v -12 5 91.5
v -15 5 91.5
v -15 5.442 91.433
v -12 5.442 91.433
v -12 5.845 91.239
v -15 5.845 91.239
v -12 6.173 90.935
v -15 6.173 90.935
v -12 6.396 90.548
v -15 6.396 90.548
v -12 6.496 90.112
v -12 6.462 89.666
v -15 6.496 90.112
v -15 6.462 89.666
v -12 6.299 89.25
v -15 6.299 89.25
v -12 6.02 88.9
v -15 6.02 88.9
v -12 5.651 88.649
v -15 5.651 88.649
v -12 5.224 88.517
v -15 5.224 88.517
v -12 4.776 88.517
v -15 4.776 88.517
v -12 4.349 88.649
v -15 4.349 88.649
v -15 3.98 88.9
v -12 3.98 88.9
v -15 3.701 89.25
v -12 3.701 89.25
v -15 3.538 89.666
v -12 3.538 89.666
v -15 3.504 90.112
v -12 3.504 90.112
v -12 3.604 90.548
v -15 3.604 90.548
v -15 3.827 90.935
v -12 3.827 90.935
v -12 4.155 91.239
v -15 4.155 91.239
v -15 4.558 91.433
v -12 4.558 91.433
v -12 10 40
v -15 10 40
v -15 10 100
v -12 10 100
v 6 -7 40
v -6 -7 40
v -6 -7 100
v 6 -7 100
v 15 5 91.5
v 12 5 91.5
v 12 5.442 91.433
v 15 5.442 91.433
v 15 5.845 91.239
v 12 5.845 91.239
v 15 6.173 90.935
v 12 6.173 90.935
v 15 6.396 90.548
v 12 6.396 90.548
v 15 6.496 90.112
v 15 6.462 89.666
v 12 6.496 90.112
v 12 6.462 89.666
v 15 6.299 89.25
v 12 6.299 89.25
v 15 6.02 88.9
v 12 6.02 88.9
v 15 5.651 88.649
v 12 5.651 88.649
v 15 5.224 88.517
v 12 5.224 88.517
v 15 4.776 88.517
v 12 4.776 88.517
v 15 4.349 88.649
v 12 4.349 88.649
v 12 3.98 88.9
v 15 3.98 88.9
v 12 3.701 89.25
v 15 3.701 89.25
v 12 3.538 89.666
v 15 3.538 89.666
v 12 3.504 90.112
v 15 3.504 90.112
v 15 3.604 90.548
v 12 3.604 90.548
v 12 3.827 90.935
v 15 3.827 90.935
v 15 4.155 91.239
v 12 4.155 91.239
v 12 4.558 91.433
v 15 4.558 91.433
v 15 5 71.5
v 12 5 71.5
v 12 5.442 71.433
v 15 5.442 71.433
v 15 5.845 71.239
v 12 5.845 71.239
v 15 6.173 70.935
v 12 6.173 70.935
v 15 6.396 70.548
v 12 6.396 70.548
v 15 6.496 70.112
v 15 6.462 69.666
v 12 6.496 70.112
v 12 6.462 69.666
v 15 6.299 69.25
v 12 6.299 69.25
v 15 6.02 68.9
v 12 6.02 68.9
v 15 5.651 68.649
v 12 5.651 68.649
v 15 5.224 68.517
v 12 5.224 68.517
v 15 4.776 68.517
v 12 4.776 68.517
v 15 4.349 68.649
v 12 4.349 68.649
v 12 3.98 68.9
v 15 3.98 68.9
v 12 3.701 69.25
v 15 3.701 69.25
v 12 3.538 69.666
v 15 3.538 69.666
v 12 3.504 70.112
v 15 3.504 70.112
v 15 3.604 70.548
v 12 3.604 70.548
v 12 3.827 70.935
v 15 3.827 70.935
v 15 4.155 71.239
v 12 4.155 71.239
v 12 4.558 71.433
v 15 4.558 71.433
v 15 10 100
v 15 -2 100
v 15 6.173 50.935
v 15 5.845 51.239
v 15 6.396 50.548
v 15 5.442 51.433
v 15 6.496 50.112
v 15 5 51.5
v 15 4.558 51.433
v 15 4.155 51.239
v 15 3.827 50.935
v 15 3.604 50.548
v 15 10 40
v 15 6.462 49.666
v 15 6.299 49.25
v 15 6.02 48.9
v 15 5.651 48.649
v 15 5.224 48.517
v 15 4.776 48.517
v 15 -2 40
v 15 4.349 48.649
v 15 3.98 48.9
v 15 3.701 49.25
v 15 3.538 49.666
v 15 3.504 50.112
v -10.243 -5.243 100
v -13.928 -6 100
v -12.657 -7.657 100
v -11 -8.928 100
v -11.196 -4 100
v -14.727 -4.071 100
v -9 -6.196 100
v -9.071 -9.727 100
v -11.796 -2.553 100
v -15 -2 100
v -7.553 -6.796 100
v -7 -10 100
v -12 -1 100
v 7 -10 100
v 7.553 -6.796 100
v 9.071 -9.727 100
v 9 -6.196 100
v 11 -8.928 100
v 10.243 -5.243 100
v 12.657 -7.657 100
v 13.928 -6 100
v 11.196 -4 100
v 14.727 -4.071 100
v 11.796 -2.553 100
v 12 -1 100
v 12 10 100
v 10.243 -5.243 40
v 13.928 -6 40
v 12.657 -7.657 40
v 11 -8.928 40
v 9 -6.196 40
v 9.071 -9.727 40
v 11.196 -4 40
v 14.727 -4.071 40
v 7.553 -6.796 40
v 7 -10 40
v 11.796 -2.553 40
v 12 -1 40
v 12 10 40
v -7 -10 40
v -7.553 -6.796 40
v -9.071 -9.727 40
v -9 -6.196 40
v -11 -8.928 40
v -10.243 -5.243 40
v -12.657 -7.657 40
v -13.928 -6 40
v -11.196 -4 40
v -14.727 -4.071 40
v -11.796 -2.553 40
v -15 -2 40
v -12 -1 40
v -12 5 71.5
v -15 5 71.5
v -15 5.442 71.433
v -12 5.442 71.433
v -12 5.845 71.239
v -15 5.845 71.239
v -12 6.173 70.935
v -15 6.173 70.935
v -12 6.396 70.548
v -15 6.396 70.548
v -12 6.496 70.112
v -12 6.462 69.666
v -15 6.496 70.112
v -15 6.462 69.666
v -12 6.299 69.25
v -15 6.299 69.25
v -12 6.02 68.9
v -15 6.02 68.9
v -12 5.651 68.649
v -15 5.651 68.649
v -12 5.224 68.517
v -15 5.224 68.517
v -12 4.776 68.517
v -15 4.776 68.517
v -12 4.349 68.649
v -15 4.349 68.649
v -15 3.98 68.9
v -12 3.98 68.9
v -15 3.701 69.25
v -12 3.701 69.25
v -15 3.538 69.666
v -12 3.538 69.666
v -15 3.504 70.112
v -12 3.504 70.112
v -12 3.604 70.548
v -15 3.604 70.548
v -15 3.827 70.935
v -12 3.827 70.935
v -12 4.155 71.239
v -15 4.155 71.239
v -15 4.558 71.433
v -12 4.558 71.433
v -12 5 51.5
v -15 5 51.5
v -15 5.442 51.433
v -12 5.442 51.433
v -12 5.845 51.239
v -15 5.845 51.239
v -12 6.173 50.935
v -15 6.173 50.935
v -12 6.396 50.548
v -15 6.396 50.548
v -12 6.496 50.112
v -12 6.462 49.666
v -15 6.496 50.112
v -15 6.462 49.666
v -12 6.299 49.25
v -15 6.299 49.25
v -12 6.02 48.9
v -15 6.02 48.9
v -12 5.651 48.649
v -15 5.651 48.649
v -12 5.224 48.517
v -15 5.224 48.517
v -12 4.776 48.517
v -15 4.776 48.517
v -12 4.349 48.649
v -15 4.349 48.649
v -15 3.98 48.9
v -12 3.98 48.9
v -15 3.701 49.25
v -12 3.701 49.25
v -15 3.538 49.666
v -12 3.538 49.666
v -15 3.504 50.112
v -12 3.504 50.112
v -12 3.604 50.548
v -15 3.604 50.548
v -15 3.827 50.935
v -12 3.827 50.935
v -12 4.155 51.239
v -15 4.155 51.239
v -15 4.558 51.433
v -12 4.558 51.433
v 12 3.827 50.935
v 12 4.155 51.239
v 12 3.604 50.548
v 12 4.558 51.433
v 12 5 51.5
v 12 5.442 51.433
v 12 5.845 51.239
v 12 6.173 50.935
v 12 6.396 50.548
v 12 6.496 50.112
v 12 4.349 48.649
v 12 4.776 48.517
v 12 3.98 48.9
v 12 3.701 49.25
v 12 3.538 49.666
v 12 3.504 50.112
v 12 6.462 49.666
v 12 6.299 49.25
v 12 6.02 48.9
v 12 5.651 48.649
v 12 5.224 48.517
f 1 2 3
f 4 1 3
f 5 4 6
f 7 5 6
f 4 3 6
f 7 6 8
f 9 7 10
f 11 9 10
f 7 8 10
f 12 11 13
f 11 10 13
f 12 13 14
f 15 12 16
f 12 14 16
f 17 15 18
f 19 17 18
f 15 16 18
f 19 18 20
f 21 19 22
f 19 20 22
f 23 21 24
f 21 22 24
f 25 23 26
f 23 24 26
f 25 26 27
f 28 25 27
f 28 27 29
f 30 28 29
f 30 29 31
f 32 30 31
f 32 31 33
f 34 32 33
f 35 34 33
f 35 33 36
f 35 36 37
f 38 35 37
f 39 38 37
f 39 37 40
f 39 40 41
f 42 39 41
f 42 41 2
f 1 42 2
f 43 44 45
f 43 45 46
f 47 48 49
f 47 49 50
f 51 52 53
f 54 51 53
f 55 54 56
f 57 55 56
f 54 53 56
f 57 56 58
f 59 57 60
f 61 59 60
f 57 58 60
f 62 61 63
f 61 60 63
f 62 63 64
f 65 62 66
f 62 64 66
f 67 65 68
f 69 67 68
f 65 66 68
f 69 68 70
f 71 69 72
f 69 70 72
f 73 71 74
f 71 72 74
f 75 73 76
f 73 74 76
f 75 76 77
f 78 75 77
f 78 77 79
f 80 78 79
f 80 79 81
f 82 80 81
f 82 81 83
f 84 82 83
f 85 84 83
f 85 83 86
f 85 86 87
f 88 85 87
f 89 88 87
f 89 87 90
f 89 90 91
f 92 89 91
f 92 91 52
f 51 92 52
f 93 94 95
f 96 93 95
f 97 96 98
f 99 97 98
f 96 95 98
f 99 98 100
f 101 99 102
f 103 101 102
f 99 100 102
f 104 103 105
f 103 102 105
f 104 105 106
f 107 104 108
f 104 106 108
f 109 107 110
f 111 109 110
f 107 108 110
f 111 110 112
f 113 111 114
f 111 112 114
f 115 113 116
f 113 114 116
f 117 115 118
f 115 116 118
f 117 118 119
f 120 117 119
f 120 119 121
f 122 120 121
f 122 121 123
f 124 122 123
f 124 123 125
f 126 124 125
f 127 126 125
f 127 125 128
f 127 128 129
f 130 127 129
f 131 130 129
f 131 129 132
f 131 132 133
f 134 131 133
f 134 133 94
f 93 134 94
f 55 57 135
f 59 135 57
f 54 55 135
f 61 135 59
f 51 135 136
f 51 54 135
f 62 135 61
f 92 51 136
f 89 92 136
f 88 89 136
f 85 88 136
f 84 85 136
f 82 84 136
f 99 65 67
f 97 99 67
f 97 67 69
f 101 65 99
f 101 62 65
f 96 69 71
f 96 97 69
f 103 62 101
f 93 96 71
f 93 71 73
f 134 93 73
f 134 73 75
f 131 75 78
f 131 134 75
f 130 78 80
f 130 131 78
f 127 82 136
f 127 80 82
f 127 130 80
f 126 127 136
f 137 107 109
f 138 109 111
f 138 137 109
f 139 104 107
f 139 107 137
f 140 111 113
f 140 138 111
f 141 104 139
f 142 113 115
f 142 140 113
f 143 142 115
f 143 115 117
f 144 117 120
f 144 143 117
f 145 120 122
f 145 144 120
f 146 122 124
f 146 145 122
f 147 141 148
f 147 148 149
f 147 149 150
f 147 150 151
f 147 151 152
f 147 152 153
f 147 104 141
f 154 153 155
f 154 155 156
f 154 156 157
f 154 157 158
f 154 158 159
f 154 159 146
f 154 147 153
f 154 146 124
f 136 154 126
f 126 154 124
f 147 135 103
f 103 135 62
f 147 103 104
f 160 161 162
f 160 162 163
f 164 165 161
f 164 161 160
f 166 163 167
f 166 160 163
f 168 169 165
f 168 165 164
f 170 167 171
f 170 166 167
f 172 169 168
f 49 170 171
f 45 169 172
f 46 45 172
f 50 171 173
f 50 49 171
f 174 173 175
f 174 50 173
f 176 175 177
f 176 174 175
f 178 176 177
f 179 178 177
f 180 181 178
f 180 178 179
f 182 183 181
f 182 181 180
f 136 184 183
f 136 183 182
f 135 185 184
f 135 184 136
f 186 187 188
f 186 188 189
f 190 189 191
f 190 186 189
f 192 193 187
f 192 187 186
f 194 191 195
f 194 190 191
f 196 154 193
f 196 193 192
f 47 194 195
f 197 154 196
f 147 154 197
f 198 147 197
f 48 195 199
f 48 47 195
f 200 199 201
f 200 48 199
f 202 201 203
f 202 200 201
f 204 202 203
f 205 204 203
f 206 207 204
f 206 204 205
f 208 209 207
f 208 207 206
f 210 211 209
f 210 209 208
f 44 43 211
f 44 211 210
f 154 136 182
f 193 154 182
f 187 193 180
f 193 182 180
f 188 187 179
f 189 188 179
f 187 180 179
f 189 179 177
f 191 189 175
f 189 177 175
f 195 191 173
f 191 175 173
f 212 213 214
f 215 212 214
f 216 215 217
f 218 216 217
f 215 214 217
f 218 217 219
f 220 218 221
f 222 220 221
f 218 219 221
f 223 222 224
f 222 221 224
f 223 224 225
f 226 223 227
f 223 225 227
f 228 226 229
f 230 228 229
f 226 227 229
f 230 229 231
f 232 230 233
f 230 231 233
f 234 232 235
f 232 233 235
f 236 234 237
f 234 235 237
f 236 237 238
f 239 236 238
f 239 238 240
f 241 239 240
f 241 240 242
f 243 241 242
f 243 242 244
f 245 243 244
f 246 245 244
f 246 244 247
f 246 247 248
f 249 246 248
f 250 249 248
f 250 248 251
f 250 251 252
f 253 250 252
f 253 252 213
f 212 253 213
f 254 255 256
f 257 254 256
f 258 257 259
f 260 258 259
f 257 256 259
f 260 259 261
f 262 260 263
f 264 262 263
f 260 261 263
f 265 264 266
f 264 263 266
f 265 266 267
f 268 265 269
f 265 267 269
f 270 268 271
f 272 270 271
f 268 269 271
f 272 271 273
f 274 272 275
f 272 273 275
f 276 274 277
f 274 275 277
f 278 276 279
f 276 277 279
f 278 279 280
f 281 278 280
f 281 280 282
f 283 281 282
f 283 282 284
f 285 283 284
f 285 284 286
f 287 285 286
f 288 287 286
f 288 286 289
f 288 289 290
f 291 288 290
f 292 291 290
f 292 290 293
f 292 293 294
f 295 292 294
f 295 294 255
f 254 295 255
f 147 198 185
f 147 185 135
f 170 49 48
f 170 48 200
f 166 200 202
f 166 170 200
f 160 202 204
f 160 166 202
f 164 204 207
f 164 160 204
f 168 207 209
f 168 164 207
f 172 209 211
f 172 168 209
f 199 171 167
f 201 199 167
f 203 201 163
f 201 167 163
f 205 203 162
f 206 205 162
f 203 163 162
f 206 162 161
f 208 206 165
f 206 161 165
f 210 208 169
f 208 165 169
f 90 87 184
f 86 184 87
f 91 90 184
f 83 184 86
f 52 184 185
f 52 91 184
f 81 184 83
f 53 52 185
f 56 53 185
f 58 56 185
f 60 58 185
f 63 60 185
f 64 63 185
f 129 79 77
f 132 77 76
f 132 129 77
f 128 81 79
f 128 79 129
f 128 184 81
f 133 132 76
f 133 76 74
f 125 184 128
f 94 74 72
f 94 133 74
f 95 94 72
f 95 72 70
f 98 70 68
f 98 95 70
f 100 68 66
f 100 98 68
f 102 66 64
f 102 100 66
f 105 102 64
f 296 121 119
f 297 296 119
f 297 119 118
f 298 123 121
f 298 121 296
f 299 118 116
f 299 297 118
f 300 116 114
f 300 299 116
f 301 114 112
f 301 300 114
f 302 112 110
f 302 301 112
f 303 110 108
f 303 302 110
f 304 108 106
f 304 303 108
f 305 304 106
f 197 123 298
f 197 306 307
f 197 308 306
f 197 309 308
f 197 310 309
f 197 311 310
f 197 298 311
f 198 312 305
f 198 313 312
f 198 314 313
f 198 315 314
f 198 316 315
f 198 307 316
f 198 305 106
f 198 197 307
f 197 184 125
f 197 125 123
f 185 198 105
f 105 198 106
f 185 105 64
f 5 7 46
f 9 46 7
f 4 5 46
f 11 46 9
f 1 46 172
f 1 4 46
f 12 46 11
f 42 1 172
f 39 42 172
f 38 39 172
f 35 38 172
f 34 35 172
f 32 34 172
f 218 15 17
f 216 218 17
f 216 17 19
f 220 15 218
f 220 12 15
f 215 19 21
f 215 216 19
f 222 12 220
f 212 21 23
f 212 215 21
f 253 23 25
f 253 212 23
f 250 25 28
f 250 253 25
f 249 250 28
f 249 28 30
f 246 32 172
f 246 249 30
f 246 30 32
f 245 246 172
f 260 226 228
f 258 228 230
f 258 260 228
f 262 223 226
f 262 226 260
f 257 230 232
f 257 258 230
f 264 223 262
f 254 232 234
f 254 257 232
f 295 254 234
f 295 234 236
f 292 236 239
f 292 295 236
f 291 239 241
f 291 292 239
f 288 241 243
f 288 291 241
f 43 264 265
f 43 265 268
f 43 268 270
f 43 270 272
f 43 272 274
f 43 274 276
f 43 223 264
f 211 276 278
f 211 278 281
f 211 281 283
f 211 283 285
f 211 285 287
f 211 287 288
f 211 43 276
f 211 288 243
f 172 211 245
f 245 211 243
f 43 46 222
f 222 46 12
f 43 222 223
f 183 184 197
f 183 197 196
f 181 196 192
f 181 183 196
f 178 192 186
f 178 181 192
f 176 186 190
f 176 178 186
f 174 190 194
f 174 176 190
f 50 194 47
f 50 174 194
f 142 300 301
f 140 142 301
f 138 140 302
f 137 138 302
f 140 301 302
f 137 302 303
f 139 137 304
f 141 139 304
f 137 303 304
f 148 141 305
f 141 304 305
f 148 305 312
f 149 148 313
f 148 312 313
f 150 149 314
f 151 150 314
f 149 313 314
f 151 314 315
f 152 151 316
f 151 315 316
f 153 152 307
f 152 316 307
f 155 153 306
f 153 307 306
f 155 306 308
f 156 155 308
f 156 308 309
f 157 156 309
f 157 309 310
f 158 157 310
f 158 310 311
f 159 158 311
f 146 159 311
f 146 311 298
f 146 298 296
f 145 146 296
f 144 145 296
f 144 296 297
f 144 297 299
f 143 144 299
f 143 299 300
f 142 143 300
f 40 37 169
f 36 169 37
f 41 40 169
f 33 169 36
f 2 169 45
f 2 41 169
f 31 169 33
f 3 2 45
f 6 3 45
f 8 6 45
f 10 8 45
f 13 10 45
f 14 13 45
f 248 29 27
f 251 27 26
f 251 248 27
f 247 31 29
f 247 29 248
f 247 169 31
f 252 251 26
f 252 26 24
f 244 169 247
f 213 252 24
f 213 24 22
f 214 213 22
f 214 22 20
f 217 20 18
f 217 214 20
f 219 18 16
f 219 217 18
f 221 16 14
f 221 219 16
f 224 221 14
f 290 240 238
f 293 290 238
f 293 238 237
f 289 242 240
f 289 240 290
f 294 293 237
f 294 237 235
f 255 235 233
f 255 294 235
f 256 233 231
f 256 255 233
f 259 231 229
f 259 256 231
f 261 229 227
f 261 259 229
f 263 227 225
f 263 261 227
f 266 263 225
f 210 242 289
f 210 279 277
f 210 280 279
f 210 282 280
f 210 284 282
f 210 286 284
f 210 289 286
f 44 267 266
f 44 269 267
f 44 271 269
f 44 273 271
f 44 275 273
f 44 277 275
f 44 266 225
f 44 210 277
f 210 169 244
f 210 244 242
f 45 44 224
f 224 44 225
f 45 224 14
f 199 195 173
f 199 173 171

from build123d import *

# Parameters (mm, degrees)
EXTRUDE_1_DEPTH     = 200
FILLET_1_R          = 8
FILLET_2_R          = 6
SKETCH_2_R          = 1.5
CUT_EXTRUDE_1_DEPTH = 203.484567313
SKETCH_3_W          = 63.1289962
SKETCH_3_H          = 24.316742519
CUT_EXTRUDE_2_DEPTH = 59
CUT_EXTRUDE_START   = -40
CUT_EXTRUDE_3_DEPTH = 40
CUT_EXTRUDE_4_DEPTH = 40


with BuildPart() as part:
    # 草图1 → 凸台-拉伸1 (new body)
    with BuildSketch(Plane.XY):
        Polygon((12, -7), (12, 10), (15, 10), (15, -10), (-15, -10), (-15, 10), (-12, 10), (-12, -7), align=None)
    extrude(amount=EXTRUDE_1_DEPTH)

    # 圆角1
    fillet_1_edges = [part.edges().sort_by_distance(p)[0] for p in [
        (15, -10, 100),
        (-15, -10, 100),
    ]]
    fillet(fillet_1_edges, radius=FILLET_1_R)

    # 圆角2
    fillet_2_edges = [part.edges().sort_by_distance(p)[0] for p in [
        (-12, -7, 100),
        (12, -7, 100),
    ]]
    fillet(fillet_2_edges, radius=FILLET_2_R)

    # 草图2 → 切除-拉伸1 (cut, through all)
    with BuildSketch(Plane.ZY.offset(15)):
        with Locations((90, 5)):
            Circle(SKETCH_2_R)
        with Locations((70, 5)):
            Circle(SKETCH_2_R)
        with Locations((50, 5)):
            Circle(SKETCH_2_R)
        with Locations((30, 5)):
            Circle(SKETCH_2_R)
        with Locations((10, 5)):
            Circle(SKETCH_2_R)
        with Locations(Location((190, 5, 0), (0, 0, 180))):
            Circle(SKETCH_2_R)
        with Locations(Location((170, 5, 0), (0, 0, 180))):
            Circle(SKETCH_2_R)
        with Locations(Location((150, 5, 0), (0, 0, 180))):
            Circle(SKETCH_2_R)
        with Locations(Location((130, 5, 0), (0, 0, 180))):
            Circle(SKETCH_2_R)
        with Locations(Location((110, 5, 0), (0, 0, 180))):
            Circle(SKETCH_2_R)
    extrude(amount=-CUT_EXTRUDE_1_DEPTH, mode=Mode.SUBTRACT)

    # 草图3 → 切除-拉伸2 (cut)
    with BuildSketch(Plane.ZY.offset(15)):
        with Locations((171.5644981, -2.15837126)):
            Rectangle(SKETCH_3_W, SKETCH_3_H)
    extrude(amount=-CUT_EXTRUDE_2_DEPTH, mode=Mode.SUBTRACT)

    # 草图4 → 切除-拉伸3 (cut)
    with BuildSketch(Plane(origin=(0, 0, 0), x_dir=(-1, 0, 0), z_dir=(0, 0, -1)).offset(CUT_EXTRUDE_START)):
        with BuildLine():
            Line((-15, 10), (-15, -2))
            ThreePointArc((-15, -2), (-12.656854249, -7.656854249), (-7, -10))
            Line((-7, -10), (7, -10))
            ThreePointArc((7, -10), (12.656854249, -7.656854249), (15, -2))
            Line((15, -2), (15, 10))
            Line((15, 10), (12, 10))
            Line((12, 10), (12, -1))
            ThreePointArc((12, -1), (10.242640687, -5.242640687), (6, -7))
            Line((6, -7), (-6, -7))
            ThreePointArc((-6, -7), (-10.242640687, -5.242640687), (-12, -1))
            Line((-12, -1), (-12, 10))
            Line((-12, 10), (-15, 10))
        make_face()
    extrude(amount=CUT_EXTRUDE_3_DEPTH, mode=Mode.SUBTRACT)

    # 草图5 → 切除-拉伸4 (cut)
    with BuildSketch(Plane.XY.offset(140)):
        with BuildLine():
            Line((15, 10), (12, 10))
            Line((12, 10), (12, -1))
            ThreePointArc((12, -1), (10.242640687, -5.242640687), (6, -7))
            Line((6, -7), (-6, -7))
            ThreePointArc((-6, -7), (-10.242640687, -5.242640687), (-12, -1))
            Line((-12, -1), (-12, 10))
            Line((-12, 10), (-15, 10))
            Line((-15, 10), (-15, -2))
            ThreePointArc((-15, -2), (-12.656854249, -7.656854249), (-7, -10))
            Line((-7, -10), (7, -10))
            ThreePointArc((7, -10), (12.656854249, -7.656854249), (15, -2))
            Line((15, -2), (15, 10))
        make_face()
    extrude(amount=-CUT_EXTRUDE_4_DEPTH, mode=Mode.SUBTRACT)


solid = part.part
